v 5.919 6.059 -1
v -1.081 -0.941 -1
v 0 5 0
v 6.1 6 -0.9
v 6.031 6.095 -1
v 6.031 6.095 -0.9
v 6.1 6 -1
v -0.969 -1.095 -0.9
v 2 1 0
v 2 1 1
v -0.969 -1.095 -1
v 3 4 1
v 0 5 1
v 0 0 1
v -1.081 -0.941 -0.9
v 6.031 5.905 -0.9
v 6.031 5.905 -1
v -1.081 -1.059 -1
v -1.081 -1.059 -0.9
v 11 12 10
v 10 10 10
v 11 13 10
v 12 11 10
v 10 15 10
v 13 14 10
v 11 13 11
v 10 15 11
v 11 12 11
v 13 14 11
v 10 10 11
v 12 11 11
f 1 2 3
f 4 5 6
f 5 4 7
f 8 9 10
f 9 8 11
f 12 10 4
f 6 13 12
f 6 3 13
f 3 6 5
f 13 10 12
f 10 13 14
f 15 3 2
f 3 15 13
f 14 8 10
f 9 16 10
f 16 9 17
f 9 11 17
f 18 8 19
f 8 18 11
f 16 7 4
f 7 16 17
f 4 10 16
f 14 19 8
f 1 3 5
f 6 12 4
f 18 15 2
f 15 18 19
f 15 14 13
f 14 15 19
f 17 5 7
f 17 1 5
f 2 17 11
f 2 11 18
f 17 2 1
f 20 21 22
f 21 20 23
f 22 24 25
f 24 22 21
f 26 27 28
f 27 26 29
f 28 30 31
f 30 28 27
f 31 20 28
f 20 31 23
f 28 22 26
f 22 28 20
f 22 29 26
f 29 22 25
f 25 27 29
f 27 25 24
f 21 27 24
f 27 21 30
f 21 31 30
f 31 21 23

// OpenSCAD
module weird_shape () {
linear_extrude(height=1) {
polygon( points=[[0,0],[2,1],[1,2],[1,3],[3,4],[0,5]] );
}}

hull () {
weird_shape();
translate ([-1,-1,-1]) cylinder(r=0.1,h=0.1);
translate ([6,6,-1]) cylinder(r=0.1,h=0.1);
}

translate([10,10,10]) weird_shape();
